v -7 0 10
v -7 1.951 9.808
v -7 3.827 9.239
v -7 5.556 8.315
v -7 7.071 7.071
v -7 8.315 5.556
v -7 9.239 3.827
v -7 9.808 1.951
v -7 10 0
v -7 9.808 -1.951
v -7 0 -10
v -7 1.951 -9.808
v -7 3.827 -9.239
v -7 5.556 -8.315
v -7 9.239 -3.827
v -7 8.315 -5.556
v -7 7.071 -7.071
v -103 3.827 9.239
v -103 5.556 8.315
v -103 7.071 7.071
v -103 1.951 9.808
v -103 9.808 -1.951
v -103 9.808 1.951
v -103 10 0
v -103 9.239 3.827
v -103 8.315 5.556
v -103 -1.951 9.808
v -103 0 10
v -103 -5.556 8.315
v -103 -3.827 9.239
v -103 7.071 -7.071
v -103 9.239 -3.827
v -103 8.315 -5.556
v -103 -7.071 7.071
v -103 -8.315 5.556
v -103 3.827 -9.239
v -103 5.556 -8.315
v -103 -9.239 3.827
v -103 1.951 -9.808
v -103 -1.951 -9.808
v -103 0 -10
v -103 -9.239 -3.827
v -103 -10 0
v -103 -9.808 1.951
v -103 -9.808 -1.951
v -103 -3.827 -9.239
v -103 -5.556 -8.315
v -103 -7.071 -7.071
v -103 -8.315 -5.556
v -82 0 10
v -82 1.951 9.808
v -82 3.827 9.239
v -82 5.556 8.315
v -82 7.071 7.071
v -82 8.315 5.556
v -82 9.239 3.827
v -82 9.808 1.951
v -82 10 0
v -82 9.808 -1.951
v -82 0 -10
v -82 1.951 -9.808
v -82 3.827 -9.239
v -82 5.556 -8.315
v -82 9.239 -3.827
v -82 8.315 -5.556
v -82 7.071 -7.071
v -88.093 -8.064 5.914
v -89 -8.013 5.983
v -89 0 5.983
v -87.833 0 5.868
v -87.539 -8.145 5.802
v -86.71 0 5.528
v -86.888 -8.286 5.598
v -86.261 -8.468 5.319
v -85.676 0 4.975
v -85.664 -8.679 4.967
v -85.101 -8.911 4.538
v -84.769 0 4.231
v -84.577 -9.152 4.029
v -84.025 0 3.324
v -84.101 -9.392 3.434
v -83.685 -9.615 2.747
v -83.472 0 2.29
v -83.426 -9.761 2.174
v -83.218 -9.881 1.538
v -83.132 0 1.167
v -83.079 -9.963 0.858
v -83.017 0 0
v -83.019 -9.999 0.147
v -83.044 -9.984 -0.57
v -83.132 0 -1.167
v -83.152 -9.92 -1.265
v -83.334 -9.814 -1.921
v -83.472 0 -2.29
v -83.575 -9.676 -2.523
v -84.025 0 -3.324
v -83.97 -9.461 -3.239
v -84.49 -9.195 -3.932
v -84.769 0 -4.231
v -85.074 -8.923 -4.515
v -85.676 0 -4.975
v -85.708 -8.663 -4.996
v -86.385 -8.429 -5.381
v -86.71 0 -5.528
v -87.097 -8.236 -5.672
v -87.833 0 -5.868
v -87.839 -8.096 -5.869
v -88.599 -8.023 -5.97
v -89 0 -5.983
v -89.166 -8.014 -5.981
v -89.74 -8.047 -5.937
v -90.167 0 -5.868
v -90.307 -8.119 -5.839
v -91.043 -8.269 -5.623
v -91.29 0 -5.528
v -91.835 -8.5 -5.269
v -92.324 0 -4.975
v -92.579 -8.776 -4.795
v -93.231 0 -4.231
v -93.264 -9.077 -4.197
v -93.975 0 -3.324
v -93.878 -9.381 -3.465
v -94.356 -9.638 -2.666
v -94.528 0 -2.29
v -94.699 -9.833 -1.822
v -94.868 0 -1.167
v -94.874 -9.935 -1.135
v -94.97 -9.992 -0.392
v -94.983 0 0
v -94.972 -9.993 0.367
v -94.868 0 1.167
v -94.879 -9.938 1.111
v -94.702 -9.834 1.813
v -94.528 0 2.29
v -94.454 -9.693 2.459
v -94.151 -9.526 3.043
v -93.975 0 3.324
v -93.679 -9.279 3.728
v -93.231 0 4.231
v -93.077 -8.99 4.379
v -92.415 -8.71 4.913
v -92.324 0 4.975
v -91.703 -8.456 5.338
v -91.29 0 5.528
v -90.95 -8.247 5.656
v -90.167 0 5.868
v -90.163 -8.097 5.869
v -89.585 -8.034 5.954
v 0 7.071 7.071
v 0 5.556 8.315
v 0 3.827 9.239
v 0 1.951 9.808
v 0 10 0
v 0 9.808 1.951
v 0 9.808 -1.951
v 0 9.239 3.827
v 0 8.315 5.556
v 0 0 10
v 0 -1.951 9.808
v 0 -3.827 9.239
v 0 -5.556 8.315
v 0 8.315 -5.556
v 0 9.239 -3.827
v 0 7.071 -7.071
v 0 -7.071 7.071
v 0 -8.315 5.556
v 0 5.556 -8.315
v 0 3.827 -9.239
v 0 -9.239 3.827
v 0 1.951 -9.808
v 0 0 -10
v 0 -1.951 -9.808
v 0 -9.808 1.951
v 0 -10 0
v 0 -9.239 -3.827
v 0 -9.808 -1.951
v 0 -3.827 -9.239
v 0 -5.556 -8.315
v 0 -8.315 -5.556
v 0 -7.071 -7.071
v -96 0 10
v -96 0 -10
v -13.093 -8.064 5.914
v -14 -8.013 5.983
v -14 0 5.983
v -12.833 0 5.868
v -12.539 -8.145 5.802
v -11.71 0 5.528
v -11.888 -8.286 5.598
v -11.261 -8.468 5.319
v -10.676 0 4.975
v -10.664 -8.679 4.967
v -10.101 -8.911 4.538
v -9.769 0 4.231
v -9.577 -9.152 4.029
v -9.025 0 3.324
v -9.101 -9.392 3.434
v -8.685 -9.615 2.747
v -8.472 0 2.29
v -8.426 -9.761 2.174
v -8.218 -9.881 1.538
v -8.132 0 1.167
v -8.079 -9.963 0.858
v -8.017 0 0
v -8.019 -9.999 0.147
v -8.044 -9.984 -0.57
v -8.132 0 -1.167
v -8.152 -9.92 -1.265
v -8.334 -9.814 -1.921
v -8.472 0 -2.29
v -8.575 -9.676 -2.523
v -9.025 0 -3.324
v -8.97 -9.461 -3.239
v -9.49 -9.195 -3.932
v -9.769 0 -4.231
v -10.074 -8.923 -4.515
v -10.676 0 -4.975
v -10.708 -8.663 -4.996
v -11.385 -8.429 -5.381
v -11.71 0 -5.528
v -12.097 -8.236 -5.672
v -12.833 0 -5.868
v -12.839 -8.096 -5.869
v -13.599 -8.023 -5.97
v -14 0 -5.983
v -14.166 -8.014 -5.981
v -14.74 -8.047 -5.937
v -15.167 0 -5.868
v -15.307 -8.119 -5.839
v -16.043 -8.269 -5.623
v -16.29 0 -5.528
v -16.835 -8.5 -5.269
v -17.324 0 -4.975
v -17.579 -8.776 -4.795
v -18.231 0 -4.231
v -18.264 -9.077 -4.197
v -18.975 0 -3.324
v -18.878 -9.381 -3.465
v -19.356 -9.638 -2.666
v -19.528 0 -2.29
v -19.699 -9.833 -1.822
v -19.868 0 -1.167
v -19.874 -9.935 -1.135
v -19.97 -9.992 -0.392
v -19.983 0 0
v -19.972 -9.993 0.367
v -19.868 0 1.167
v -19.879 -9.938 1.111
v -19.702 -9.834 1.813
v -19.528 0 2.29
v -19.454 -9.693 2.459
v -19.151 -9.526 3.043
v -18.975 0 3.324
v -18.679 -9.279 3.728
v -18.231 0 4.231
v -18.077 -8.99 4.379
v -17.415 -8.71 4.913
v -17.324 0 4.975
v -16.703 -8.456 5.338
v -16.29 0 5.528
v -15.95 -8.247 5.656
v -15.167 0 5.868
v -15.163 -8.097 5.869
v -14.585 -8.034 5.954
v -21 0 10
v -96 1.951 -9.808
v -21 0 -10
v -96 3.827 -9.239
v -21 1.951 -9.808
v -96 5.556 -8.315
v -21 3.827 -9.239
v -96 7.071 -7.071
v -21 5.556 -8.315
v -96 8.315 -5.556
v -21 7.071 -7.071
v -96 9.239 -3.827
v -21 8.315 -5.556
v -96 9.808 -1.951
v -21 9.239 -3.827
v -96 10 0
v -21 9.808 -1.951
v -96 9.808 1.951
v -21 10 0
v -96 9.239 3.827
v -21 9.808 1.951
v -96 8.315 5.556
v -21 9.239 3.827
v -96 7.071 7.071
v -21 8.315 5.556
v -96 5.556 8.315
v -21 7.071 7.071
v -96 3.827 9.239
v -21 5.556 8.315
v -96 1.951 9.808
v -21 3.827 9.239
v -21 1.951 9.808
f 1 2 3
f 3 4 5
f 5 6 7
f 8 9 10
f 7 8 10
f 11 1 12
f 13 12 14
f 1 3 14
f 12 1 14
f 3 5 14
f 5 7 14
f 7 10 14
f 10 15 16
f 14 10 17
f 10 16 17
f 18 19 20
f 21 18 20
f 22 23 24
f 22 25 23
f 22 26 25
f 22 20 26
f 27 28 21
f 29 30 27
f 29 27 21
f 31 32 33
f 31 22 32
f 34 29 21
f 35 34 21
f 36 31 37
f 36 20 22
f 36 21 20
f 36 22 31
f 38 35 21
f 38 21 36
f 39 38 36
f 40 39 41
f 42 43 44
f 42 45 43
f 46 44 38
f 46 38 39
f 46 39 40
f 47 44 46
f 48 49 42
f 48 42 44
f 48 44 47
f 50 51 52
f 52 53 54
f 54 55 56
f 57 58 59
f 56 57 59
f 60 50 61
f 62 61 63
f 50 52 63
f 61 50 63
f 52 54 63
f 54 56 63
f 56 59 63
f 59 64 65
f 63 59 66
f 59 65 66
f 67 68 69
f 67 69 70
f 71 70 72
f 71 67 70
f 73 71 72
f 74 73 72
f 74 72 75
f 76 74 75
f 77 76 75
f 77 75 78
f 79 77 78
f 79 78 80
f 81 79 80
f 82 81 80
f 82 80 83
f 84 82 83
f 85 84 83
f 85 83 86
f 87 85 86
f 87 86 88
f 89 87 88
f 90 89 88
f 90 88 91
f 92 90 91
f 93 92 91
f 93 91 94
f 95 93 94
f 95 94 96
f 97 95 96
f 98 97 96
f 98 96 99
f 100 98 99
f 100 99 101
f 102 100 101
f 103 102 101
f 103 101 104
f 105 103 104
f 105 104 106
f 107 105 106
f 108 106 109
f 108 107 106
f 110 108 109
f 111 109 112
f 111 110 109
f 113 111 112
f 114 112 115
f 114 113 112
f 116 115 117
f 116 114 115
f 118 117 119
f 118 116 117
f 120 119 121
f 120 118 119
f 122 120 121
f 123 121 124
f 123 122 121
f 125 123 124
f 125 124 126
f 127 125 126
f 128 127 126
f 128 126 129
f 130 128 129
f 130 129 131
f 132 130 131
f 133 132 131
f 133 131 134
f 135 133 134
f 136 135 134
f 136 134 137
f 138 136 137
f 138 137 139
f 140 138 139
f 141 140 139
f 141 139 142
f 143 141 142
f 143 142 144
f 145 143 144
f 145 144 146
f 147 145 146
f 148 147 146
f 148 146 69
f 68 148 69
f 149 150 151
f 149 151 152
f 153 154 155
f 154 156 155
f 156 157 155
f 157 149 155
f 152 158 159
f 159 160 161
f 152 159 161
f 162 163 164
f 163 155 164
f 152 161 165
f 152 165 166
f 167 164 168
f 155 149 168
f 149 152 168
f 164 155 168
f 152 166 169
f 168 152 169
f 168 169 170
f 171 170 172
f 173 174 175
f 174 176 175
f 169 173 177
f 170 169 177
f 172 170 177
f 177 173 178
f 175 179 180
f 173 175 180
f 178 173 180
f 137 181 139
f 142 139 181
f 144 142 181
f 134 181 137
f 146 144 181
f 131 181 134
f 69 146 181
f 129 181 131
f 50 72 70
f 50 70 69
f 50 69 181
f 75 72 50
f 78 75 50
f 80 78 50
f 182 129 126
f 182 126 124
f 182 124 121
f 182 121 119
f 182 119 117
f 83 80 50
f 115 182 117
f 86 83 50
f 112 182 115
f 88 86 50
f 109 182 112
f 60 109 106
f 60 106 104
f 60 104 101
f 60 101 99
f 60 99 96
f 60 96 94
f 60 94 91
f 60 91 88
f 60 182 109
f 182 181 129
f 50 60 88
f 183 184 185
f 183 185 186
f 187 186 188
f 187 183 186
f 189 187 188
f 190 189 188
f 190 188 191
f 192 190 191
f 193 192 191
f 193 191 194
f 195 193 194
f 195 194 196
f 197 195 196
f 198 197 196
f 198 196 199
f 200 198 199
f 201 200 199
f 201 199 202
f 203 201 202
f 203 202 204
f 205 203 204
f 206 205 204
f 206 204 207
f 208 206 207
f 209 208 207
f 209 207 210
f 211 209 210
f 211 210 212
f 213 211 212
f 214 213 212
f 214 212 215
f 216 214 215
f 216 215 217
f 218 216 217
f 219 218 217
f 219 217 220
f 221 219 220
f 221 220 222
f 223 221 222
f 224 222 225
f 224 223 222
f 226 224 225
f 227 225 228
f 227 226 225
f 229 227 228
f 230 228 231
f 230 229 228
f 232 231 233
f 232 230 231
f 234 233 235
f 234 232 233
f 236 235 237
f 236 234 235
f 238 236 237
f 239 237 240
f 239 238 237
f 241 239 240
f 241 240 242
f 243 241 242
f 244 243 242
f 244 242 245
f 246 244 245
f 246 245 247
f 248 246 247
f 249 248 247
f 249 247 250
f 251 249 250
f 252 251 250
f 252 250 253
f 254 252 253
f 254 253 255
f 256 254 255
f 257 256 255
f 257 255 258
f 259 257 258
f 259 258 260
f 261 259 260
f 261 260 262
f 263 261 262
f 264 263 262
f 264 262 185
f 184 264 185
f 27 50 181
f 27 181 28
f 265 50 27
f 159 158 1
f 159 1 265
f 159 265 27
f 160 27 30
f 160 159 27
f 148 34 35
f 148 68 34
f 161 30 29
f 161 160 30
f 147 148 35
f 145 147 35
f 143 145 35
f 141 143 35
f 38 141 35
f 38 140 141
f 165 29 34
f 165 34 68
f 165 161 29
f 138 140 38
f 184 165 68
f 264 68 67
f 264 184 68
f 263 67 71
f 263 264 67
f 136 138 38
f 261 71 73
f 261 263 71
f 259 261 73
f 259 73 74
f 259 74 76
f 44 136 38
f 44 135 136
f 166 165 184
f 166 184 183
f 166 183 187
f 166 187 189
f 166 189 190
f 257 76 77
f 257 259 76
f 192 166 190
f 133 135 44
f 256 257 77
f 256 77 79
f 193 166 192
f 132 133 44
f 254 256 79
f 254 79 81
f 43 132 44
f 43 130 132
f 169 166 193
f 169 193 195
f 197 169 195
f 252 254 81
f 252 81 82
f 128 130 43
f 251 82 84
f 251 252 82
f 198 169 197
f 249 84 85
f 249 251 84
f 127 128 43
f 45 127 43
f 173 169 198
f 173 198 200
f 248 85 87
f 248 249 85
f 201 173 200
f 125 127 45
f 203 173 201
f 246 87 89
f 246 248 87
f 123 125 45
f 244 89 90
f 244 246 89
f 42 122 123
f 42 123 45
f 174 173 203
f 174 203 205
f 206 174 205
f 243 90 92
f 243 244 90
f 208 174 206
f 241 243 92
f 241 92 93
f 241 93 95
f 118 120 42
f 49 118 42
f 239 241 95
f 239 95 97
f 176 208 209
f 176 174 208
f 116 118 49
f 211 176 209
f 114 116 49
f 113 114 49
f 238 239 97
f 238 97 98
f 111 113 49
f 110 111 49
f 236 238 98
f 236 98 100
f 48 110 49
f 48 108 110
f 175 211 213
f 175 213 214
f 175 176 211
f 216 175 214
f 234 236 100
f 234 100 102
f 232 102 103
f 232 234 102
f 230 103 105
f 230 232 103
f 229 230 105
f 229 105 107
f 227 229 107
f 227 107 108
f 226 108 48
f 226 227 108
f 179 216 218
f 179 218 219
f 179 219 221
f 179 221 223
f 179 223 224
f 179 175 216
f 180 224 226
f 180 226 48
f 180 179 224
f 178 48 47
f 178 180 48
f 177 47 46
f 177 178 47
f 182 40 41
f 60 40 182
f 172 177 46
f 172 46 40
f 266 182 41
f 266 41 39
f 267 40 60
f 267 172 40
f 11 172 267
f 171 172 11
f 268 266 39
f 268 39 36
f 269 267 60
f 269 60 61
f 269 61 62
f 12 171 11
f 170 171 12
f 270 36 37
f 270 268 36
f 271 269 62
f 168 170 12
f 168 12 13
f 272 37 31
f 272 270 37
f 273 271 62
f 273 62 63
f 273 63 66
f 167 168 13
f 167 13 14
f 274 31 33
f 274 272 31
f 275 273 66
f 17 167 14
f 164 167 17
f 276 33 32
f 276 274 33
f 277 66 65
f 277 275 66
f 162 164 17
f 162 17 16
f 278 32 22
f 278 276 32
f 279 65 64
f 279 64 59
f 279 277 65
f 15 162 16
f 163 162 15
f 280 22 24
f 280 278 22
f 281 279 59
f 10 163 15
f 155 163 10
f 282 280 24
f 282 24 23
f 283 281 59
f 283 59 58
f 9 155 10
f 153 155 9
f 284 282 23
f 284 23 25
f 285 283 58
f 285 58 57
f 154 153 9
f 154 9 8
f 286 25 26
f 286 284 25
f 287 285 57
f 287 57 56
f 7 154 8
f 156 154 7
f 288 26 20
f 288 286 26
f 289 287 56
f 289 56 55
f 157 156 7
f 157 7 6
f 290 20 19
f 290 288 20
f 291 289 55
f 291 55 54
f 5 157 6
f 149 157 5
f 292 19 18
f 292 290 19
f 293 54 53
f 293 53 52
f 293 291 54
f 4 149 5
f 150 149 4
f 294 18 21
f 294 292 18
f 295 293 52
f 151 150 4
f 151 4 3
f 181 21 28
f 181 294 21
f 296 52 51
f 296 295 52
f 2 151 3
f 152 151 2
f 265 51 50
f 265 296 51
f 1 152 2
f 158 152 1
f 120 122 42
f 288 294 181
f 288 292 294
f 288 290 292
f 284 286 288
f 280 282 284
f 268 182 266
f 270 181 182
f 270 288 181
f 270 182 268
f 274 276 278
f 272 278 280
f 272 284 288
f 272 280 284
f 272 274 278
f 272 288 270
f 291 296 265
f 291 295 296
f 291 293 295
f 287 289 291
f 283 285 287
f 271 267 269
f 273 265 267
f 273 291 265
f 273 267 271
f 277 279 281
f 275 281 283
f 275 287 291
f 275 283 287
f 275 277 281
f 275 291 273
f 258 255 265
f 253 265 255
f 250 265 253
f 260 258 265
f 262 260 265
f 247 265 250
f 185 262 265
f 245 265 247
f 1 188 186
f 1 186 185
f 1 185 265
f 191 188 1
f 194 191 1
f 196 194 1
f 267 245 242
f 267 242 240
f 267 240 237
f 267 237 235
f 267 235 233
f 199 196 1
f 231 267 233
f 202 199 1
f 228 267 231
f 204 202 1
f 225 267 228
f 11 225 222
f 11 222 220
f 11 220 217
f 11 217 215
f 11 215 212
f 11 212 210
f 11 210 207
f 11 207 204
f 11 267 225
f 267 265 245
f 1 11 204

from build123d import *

# Parameters (mm, degrees)
SKETCH1_W               = 103
SKETCH1_H               = 10
CUT_EXTRUDE1_START      = -7
CUT_EXTRUDE1_DEPTH      = 14
CUT_EXTRUDE2_START      = -7
CUT_EXTRUDE2_DEPTH      = 14
CUT_EXTRUDE3_DEPTH      = 104.966340707
CUT_EXTRUDE3_DEPTH_BACK = 104.966340707
SKETCH4_R               = 5.983
SKETCH5_W               = 14
SKETCH5_H               = 25.426935298
CUT_EXTRUDE4_DEPTH      = 5


with BuildPart() as part:
    # Sketch1 → Revolve1 (revolve)
    with BuildSketch(Plane.XY, mode=Mode.PRIVATE) as revolve1_sk:
        with Locations((-51.5, 5)):
            Rectangle(SKETCH1_W, SKETCH1_H)
    revolve(revolve1_sk.sketch.rotate(Axis((-103, 0, 0), (1, 0, 0)), 90), axis=Axis((-103, 0, 0), (1, 0, 0)))

    # Sketch2 → Cut-Extrude1 (cut)
    with BuildSketch(Plane(origin=(0, 0, 0), x_dir=(0, 0, -1), z_dir=(1, 0, 0)).offset(CUT_EXTRUDE1_START)):
        with BuildLine():
            Line((-10.872335562, 5), (10.872335562, 5))
            ThreePointArc((10.872335562, 5), (0, 11.966941154), (-10.872335562, 5))
        make_face()
    extrude(amount=-CUT_EXTRUDE1_DEPTH, mode=Mode.SUBTRACT)

    # Sketch3 → Cut-Extrude2 (cut)
    with BuildSketch(Plane.ZY.offset(103).offset(CUT_EXTRUDE2_START)):
        with BuildLine():
            Line((-13.431588828, 5), (13.431588828, 5))
            ThreePointArc((13.431588828, 5), (0, 14.332047252), (-13.431588828, 5))
        make_face()
    extrude(amount=-CUT_EXTRUDE2_DEPTH, mode=Mode.SUBTRACT)

    # Sketch4 → Cut-Extrude3 (cut, two sides: drawn at the far end of the back side and taken through both)
    with BuildSketch(Plane(origin=(0, 0, 0), x_dir=(1, 0, 0), z_dir=(0, 1, 0)).offset(-CUT_EXTRUDE3_DEPTH_BACK)):
        with Locations(Location((-89, 0, 0), (0, 0, 270))):
            Circle(SKETCH4_R)
        with Locations(Location((-14, 0, 0), (0, 0, 270))):
            Circle(SKETCH4_R)
    extrude(amount=CUT_EXTRUDE3_DEPTH + CUT_EXTRUDE3_DEPTH_BACK, mode=Mode.SUBTRACT)

    # Sketch5 → Cut-Extrude4 (cut)
    with BuildSketch(Plane(origin=(0, 5, 0), x_dir=(1, 0, 0), z_dir=(0, 1, 0))):
        with Locations((-89, 0)):
            Rectangle(SKETCH5_W, SKETCH5_H)
        with Locations((-14, 0)):
            Rectangle(SKETCH5_W, SKETCH5_H)
    extrude(amount=-CUT_EXTRUDE4_DEPTH, mode=Mode.SUBTRACT)


solid = part.part
